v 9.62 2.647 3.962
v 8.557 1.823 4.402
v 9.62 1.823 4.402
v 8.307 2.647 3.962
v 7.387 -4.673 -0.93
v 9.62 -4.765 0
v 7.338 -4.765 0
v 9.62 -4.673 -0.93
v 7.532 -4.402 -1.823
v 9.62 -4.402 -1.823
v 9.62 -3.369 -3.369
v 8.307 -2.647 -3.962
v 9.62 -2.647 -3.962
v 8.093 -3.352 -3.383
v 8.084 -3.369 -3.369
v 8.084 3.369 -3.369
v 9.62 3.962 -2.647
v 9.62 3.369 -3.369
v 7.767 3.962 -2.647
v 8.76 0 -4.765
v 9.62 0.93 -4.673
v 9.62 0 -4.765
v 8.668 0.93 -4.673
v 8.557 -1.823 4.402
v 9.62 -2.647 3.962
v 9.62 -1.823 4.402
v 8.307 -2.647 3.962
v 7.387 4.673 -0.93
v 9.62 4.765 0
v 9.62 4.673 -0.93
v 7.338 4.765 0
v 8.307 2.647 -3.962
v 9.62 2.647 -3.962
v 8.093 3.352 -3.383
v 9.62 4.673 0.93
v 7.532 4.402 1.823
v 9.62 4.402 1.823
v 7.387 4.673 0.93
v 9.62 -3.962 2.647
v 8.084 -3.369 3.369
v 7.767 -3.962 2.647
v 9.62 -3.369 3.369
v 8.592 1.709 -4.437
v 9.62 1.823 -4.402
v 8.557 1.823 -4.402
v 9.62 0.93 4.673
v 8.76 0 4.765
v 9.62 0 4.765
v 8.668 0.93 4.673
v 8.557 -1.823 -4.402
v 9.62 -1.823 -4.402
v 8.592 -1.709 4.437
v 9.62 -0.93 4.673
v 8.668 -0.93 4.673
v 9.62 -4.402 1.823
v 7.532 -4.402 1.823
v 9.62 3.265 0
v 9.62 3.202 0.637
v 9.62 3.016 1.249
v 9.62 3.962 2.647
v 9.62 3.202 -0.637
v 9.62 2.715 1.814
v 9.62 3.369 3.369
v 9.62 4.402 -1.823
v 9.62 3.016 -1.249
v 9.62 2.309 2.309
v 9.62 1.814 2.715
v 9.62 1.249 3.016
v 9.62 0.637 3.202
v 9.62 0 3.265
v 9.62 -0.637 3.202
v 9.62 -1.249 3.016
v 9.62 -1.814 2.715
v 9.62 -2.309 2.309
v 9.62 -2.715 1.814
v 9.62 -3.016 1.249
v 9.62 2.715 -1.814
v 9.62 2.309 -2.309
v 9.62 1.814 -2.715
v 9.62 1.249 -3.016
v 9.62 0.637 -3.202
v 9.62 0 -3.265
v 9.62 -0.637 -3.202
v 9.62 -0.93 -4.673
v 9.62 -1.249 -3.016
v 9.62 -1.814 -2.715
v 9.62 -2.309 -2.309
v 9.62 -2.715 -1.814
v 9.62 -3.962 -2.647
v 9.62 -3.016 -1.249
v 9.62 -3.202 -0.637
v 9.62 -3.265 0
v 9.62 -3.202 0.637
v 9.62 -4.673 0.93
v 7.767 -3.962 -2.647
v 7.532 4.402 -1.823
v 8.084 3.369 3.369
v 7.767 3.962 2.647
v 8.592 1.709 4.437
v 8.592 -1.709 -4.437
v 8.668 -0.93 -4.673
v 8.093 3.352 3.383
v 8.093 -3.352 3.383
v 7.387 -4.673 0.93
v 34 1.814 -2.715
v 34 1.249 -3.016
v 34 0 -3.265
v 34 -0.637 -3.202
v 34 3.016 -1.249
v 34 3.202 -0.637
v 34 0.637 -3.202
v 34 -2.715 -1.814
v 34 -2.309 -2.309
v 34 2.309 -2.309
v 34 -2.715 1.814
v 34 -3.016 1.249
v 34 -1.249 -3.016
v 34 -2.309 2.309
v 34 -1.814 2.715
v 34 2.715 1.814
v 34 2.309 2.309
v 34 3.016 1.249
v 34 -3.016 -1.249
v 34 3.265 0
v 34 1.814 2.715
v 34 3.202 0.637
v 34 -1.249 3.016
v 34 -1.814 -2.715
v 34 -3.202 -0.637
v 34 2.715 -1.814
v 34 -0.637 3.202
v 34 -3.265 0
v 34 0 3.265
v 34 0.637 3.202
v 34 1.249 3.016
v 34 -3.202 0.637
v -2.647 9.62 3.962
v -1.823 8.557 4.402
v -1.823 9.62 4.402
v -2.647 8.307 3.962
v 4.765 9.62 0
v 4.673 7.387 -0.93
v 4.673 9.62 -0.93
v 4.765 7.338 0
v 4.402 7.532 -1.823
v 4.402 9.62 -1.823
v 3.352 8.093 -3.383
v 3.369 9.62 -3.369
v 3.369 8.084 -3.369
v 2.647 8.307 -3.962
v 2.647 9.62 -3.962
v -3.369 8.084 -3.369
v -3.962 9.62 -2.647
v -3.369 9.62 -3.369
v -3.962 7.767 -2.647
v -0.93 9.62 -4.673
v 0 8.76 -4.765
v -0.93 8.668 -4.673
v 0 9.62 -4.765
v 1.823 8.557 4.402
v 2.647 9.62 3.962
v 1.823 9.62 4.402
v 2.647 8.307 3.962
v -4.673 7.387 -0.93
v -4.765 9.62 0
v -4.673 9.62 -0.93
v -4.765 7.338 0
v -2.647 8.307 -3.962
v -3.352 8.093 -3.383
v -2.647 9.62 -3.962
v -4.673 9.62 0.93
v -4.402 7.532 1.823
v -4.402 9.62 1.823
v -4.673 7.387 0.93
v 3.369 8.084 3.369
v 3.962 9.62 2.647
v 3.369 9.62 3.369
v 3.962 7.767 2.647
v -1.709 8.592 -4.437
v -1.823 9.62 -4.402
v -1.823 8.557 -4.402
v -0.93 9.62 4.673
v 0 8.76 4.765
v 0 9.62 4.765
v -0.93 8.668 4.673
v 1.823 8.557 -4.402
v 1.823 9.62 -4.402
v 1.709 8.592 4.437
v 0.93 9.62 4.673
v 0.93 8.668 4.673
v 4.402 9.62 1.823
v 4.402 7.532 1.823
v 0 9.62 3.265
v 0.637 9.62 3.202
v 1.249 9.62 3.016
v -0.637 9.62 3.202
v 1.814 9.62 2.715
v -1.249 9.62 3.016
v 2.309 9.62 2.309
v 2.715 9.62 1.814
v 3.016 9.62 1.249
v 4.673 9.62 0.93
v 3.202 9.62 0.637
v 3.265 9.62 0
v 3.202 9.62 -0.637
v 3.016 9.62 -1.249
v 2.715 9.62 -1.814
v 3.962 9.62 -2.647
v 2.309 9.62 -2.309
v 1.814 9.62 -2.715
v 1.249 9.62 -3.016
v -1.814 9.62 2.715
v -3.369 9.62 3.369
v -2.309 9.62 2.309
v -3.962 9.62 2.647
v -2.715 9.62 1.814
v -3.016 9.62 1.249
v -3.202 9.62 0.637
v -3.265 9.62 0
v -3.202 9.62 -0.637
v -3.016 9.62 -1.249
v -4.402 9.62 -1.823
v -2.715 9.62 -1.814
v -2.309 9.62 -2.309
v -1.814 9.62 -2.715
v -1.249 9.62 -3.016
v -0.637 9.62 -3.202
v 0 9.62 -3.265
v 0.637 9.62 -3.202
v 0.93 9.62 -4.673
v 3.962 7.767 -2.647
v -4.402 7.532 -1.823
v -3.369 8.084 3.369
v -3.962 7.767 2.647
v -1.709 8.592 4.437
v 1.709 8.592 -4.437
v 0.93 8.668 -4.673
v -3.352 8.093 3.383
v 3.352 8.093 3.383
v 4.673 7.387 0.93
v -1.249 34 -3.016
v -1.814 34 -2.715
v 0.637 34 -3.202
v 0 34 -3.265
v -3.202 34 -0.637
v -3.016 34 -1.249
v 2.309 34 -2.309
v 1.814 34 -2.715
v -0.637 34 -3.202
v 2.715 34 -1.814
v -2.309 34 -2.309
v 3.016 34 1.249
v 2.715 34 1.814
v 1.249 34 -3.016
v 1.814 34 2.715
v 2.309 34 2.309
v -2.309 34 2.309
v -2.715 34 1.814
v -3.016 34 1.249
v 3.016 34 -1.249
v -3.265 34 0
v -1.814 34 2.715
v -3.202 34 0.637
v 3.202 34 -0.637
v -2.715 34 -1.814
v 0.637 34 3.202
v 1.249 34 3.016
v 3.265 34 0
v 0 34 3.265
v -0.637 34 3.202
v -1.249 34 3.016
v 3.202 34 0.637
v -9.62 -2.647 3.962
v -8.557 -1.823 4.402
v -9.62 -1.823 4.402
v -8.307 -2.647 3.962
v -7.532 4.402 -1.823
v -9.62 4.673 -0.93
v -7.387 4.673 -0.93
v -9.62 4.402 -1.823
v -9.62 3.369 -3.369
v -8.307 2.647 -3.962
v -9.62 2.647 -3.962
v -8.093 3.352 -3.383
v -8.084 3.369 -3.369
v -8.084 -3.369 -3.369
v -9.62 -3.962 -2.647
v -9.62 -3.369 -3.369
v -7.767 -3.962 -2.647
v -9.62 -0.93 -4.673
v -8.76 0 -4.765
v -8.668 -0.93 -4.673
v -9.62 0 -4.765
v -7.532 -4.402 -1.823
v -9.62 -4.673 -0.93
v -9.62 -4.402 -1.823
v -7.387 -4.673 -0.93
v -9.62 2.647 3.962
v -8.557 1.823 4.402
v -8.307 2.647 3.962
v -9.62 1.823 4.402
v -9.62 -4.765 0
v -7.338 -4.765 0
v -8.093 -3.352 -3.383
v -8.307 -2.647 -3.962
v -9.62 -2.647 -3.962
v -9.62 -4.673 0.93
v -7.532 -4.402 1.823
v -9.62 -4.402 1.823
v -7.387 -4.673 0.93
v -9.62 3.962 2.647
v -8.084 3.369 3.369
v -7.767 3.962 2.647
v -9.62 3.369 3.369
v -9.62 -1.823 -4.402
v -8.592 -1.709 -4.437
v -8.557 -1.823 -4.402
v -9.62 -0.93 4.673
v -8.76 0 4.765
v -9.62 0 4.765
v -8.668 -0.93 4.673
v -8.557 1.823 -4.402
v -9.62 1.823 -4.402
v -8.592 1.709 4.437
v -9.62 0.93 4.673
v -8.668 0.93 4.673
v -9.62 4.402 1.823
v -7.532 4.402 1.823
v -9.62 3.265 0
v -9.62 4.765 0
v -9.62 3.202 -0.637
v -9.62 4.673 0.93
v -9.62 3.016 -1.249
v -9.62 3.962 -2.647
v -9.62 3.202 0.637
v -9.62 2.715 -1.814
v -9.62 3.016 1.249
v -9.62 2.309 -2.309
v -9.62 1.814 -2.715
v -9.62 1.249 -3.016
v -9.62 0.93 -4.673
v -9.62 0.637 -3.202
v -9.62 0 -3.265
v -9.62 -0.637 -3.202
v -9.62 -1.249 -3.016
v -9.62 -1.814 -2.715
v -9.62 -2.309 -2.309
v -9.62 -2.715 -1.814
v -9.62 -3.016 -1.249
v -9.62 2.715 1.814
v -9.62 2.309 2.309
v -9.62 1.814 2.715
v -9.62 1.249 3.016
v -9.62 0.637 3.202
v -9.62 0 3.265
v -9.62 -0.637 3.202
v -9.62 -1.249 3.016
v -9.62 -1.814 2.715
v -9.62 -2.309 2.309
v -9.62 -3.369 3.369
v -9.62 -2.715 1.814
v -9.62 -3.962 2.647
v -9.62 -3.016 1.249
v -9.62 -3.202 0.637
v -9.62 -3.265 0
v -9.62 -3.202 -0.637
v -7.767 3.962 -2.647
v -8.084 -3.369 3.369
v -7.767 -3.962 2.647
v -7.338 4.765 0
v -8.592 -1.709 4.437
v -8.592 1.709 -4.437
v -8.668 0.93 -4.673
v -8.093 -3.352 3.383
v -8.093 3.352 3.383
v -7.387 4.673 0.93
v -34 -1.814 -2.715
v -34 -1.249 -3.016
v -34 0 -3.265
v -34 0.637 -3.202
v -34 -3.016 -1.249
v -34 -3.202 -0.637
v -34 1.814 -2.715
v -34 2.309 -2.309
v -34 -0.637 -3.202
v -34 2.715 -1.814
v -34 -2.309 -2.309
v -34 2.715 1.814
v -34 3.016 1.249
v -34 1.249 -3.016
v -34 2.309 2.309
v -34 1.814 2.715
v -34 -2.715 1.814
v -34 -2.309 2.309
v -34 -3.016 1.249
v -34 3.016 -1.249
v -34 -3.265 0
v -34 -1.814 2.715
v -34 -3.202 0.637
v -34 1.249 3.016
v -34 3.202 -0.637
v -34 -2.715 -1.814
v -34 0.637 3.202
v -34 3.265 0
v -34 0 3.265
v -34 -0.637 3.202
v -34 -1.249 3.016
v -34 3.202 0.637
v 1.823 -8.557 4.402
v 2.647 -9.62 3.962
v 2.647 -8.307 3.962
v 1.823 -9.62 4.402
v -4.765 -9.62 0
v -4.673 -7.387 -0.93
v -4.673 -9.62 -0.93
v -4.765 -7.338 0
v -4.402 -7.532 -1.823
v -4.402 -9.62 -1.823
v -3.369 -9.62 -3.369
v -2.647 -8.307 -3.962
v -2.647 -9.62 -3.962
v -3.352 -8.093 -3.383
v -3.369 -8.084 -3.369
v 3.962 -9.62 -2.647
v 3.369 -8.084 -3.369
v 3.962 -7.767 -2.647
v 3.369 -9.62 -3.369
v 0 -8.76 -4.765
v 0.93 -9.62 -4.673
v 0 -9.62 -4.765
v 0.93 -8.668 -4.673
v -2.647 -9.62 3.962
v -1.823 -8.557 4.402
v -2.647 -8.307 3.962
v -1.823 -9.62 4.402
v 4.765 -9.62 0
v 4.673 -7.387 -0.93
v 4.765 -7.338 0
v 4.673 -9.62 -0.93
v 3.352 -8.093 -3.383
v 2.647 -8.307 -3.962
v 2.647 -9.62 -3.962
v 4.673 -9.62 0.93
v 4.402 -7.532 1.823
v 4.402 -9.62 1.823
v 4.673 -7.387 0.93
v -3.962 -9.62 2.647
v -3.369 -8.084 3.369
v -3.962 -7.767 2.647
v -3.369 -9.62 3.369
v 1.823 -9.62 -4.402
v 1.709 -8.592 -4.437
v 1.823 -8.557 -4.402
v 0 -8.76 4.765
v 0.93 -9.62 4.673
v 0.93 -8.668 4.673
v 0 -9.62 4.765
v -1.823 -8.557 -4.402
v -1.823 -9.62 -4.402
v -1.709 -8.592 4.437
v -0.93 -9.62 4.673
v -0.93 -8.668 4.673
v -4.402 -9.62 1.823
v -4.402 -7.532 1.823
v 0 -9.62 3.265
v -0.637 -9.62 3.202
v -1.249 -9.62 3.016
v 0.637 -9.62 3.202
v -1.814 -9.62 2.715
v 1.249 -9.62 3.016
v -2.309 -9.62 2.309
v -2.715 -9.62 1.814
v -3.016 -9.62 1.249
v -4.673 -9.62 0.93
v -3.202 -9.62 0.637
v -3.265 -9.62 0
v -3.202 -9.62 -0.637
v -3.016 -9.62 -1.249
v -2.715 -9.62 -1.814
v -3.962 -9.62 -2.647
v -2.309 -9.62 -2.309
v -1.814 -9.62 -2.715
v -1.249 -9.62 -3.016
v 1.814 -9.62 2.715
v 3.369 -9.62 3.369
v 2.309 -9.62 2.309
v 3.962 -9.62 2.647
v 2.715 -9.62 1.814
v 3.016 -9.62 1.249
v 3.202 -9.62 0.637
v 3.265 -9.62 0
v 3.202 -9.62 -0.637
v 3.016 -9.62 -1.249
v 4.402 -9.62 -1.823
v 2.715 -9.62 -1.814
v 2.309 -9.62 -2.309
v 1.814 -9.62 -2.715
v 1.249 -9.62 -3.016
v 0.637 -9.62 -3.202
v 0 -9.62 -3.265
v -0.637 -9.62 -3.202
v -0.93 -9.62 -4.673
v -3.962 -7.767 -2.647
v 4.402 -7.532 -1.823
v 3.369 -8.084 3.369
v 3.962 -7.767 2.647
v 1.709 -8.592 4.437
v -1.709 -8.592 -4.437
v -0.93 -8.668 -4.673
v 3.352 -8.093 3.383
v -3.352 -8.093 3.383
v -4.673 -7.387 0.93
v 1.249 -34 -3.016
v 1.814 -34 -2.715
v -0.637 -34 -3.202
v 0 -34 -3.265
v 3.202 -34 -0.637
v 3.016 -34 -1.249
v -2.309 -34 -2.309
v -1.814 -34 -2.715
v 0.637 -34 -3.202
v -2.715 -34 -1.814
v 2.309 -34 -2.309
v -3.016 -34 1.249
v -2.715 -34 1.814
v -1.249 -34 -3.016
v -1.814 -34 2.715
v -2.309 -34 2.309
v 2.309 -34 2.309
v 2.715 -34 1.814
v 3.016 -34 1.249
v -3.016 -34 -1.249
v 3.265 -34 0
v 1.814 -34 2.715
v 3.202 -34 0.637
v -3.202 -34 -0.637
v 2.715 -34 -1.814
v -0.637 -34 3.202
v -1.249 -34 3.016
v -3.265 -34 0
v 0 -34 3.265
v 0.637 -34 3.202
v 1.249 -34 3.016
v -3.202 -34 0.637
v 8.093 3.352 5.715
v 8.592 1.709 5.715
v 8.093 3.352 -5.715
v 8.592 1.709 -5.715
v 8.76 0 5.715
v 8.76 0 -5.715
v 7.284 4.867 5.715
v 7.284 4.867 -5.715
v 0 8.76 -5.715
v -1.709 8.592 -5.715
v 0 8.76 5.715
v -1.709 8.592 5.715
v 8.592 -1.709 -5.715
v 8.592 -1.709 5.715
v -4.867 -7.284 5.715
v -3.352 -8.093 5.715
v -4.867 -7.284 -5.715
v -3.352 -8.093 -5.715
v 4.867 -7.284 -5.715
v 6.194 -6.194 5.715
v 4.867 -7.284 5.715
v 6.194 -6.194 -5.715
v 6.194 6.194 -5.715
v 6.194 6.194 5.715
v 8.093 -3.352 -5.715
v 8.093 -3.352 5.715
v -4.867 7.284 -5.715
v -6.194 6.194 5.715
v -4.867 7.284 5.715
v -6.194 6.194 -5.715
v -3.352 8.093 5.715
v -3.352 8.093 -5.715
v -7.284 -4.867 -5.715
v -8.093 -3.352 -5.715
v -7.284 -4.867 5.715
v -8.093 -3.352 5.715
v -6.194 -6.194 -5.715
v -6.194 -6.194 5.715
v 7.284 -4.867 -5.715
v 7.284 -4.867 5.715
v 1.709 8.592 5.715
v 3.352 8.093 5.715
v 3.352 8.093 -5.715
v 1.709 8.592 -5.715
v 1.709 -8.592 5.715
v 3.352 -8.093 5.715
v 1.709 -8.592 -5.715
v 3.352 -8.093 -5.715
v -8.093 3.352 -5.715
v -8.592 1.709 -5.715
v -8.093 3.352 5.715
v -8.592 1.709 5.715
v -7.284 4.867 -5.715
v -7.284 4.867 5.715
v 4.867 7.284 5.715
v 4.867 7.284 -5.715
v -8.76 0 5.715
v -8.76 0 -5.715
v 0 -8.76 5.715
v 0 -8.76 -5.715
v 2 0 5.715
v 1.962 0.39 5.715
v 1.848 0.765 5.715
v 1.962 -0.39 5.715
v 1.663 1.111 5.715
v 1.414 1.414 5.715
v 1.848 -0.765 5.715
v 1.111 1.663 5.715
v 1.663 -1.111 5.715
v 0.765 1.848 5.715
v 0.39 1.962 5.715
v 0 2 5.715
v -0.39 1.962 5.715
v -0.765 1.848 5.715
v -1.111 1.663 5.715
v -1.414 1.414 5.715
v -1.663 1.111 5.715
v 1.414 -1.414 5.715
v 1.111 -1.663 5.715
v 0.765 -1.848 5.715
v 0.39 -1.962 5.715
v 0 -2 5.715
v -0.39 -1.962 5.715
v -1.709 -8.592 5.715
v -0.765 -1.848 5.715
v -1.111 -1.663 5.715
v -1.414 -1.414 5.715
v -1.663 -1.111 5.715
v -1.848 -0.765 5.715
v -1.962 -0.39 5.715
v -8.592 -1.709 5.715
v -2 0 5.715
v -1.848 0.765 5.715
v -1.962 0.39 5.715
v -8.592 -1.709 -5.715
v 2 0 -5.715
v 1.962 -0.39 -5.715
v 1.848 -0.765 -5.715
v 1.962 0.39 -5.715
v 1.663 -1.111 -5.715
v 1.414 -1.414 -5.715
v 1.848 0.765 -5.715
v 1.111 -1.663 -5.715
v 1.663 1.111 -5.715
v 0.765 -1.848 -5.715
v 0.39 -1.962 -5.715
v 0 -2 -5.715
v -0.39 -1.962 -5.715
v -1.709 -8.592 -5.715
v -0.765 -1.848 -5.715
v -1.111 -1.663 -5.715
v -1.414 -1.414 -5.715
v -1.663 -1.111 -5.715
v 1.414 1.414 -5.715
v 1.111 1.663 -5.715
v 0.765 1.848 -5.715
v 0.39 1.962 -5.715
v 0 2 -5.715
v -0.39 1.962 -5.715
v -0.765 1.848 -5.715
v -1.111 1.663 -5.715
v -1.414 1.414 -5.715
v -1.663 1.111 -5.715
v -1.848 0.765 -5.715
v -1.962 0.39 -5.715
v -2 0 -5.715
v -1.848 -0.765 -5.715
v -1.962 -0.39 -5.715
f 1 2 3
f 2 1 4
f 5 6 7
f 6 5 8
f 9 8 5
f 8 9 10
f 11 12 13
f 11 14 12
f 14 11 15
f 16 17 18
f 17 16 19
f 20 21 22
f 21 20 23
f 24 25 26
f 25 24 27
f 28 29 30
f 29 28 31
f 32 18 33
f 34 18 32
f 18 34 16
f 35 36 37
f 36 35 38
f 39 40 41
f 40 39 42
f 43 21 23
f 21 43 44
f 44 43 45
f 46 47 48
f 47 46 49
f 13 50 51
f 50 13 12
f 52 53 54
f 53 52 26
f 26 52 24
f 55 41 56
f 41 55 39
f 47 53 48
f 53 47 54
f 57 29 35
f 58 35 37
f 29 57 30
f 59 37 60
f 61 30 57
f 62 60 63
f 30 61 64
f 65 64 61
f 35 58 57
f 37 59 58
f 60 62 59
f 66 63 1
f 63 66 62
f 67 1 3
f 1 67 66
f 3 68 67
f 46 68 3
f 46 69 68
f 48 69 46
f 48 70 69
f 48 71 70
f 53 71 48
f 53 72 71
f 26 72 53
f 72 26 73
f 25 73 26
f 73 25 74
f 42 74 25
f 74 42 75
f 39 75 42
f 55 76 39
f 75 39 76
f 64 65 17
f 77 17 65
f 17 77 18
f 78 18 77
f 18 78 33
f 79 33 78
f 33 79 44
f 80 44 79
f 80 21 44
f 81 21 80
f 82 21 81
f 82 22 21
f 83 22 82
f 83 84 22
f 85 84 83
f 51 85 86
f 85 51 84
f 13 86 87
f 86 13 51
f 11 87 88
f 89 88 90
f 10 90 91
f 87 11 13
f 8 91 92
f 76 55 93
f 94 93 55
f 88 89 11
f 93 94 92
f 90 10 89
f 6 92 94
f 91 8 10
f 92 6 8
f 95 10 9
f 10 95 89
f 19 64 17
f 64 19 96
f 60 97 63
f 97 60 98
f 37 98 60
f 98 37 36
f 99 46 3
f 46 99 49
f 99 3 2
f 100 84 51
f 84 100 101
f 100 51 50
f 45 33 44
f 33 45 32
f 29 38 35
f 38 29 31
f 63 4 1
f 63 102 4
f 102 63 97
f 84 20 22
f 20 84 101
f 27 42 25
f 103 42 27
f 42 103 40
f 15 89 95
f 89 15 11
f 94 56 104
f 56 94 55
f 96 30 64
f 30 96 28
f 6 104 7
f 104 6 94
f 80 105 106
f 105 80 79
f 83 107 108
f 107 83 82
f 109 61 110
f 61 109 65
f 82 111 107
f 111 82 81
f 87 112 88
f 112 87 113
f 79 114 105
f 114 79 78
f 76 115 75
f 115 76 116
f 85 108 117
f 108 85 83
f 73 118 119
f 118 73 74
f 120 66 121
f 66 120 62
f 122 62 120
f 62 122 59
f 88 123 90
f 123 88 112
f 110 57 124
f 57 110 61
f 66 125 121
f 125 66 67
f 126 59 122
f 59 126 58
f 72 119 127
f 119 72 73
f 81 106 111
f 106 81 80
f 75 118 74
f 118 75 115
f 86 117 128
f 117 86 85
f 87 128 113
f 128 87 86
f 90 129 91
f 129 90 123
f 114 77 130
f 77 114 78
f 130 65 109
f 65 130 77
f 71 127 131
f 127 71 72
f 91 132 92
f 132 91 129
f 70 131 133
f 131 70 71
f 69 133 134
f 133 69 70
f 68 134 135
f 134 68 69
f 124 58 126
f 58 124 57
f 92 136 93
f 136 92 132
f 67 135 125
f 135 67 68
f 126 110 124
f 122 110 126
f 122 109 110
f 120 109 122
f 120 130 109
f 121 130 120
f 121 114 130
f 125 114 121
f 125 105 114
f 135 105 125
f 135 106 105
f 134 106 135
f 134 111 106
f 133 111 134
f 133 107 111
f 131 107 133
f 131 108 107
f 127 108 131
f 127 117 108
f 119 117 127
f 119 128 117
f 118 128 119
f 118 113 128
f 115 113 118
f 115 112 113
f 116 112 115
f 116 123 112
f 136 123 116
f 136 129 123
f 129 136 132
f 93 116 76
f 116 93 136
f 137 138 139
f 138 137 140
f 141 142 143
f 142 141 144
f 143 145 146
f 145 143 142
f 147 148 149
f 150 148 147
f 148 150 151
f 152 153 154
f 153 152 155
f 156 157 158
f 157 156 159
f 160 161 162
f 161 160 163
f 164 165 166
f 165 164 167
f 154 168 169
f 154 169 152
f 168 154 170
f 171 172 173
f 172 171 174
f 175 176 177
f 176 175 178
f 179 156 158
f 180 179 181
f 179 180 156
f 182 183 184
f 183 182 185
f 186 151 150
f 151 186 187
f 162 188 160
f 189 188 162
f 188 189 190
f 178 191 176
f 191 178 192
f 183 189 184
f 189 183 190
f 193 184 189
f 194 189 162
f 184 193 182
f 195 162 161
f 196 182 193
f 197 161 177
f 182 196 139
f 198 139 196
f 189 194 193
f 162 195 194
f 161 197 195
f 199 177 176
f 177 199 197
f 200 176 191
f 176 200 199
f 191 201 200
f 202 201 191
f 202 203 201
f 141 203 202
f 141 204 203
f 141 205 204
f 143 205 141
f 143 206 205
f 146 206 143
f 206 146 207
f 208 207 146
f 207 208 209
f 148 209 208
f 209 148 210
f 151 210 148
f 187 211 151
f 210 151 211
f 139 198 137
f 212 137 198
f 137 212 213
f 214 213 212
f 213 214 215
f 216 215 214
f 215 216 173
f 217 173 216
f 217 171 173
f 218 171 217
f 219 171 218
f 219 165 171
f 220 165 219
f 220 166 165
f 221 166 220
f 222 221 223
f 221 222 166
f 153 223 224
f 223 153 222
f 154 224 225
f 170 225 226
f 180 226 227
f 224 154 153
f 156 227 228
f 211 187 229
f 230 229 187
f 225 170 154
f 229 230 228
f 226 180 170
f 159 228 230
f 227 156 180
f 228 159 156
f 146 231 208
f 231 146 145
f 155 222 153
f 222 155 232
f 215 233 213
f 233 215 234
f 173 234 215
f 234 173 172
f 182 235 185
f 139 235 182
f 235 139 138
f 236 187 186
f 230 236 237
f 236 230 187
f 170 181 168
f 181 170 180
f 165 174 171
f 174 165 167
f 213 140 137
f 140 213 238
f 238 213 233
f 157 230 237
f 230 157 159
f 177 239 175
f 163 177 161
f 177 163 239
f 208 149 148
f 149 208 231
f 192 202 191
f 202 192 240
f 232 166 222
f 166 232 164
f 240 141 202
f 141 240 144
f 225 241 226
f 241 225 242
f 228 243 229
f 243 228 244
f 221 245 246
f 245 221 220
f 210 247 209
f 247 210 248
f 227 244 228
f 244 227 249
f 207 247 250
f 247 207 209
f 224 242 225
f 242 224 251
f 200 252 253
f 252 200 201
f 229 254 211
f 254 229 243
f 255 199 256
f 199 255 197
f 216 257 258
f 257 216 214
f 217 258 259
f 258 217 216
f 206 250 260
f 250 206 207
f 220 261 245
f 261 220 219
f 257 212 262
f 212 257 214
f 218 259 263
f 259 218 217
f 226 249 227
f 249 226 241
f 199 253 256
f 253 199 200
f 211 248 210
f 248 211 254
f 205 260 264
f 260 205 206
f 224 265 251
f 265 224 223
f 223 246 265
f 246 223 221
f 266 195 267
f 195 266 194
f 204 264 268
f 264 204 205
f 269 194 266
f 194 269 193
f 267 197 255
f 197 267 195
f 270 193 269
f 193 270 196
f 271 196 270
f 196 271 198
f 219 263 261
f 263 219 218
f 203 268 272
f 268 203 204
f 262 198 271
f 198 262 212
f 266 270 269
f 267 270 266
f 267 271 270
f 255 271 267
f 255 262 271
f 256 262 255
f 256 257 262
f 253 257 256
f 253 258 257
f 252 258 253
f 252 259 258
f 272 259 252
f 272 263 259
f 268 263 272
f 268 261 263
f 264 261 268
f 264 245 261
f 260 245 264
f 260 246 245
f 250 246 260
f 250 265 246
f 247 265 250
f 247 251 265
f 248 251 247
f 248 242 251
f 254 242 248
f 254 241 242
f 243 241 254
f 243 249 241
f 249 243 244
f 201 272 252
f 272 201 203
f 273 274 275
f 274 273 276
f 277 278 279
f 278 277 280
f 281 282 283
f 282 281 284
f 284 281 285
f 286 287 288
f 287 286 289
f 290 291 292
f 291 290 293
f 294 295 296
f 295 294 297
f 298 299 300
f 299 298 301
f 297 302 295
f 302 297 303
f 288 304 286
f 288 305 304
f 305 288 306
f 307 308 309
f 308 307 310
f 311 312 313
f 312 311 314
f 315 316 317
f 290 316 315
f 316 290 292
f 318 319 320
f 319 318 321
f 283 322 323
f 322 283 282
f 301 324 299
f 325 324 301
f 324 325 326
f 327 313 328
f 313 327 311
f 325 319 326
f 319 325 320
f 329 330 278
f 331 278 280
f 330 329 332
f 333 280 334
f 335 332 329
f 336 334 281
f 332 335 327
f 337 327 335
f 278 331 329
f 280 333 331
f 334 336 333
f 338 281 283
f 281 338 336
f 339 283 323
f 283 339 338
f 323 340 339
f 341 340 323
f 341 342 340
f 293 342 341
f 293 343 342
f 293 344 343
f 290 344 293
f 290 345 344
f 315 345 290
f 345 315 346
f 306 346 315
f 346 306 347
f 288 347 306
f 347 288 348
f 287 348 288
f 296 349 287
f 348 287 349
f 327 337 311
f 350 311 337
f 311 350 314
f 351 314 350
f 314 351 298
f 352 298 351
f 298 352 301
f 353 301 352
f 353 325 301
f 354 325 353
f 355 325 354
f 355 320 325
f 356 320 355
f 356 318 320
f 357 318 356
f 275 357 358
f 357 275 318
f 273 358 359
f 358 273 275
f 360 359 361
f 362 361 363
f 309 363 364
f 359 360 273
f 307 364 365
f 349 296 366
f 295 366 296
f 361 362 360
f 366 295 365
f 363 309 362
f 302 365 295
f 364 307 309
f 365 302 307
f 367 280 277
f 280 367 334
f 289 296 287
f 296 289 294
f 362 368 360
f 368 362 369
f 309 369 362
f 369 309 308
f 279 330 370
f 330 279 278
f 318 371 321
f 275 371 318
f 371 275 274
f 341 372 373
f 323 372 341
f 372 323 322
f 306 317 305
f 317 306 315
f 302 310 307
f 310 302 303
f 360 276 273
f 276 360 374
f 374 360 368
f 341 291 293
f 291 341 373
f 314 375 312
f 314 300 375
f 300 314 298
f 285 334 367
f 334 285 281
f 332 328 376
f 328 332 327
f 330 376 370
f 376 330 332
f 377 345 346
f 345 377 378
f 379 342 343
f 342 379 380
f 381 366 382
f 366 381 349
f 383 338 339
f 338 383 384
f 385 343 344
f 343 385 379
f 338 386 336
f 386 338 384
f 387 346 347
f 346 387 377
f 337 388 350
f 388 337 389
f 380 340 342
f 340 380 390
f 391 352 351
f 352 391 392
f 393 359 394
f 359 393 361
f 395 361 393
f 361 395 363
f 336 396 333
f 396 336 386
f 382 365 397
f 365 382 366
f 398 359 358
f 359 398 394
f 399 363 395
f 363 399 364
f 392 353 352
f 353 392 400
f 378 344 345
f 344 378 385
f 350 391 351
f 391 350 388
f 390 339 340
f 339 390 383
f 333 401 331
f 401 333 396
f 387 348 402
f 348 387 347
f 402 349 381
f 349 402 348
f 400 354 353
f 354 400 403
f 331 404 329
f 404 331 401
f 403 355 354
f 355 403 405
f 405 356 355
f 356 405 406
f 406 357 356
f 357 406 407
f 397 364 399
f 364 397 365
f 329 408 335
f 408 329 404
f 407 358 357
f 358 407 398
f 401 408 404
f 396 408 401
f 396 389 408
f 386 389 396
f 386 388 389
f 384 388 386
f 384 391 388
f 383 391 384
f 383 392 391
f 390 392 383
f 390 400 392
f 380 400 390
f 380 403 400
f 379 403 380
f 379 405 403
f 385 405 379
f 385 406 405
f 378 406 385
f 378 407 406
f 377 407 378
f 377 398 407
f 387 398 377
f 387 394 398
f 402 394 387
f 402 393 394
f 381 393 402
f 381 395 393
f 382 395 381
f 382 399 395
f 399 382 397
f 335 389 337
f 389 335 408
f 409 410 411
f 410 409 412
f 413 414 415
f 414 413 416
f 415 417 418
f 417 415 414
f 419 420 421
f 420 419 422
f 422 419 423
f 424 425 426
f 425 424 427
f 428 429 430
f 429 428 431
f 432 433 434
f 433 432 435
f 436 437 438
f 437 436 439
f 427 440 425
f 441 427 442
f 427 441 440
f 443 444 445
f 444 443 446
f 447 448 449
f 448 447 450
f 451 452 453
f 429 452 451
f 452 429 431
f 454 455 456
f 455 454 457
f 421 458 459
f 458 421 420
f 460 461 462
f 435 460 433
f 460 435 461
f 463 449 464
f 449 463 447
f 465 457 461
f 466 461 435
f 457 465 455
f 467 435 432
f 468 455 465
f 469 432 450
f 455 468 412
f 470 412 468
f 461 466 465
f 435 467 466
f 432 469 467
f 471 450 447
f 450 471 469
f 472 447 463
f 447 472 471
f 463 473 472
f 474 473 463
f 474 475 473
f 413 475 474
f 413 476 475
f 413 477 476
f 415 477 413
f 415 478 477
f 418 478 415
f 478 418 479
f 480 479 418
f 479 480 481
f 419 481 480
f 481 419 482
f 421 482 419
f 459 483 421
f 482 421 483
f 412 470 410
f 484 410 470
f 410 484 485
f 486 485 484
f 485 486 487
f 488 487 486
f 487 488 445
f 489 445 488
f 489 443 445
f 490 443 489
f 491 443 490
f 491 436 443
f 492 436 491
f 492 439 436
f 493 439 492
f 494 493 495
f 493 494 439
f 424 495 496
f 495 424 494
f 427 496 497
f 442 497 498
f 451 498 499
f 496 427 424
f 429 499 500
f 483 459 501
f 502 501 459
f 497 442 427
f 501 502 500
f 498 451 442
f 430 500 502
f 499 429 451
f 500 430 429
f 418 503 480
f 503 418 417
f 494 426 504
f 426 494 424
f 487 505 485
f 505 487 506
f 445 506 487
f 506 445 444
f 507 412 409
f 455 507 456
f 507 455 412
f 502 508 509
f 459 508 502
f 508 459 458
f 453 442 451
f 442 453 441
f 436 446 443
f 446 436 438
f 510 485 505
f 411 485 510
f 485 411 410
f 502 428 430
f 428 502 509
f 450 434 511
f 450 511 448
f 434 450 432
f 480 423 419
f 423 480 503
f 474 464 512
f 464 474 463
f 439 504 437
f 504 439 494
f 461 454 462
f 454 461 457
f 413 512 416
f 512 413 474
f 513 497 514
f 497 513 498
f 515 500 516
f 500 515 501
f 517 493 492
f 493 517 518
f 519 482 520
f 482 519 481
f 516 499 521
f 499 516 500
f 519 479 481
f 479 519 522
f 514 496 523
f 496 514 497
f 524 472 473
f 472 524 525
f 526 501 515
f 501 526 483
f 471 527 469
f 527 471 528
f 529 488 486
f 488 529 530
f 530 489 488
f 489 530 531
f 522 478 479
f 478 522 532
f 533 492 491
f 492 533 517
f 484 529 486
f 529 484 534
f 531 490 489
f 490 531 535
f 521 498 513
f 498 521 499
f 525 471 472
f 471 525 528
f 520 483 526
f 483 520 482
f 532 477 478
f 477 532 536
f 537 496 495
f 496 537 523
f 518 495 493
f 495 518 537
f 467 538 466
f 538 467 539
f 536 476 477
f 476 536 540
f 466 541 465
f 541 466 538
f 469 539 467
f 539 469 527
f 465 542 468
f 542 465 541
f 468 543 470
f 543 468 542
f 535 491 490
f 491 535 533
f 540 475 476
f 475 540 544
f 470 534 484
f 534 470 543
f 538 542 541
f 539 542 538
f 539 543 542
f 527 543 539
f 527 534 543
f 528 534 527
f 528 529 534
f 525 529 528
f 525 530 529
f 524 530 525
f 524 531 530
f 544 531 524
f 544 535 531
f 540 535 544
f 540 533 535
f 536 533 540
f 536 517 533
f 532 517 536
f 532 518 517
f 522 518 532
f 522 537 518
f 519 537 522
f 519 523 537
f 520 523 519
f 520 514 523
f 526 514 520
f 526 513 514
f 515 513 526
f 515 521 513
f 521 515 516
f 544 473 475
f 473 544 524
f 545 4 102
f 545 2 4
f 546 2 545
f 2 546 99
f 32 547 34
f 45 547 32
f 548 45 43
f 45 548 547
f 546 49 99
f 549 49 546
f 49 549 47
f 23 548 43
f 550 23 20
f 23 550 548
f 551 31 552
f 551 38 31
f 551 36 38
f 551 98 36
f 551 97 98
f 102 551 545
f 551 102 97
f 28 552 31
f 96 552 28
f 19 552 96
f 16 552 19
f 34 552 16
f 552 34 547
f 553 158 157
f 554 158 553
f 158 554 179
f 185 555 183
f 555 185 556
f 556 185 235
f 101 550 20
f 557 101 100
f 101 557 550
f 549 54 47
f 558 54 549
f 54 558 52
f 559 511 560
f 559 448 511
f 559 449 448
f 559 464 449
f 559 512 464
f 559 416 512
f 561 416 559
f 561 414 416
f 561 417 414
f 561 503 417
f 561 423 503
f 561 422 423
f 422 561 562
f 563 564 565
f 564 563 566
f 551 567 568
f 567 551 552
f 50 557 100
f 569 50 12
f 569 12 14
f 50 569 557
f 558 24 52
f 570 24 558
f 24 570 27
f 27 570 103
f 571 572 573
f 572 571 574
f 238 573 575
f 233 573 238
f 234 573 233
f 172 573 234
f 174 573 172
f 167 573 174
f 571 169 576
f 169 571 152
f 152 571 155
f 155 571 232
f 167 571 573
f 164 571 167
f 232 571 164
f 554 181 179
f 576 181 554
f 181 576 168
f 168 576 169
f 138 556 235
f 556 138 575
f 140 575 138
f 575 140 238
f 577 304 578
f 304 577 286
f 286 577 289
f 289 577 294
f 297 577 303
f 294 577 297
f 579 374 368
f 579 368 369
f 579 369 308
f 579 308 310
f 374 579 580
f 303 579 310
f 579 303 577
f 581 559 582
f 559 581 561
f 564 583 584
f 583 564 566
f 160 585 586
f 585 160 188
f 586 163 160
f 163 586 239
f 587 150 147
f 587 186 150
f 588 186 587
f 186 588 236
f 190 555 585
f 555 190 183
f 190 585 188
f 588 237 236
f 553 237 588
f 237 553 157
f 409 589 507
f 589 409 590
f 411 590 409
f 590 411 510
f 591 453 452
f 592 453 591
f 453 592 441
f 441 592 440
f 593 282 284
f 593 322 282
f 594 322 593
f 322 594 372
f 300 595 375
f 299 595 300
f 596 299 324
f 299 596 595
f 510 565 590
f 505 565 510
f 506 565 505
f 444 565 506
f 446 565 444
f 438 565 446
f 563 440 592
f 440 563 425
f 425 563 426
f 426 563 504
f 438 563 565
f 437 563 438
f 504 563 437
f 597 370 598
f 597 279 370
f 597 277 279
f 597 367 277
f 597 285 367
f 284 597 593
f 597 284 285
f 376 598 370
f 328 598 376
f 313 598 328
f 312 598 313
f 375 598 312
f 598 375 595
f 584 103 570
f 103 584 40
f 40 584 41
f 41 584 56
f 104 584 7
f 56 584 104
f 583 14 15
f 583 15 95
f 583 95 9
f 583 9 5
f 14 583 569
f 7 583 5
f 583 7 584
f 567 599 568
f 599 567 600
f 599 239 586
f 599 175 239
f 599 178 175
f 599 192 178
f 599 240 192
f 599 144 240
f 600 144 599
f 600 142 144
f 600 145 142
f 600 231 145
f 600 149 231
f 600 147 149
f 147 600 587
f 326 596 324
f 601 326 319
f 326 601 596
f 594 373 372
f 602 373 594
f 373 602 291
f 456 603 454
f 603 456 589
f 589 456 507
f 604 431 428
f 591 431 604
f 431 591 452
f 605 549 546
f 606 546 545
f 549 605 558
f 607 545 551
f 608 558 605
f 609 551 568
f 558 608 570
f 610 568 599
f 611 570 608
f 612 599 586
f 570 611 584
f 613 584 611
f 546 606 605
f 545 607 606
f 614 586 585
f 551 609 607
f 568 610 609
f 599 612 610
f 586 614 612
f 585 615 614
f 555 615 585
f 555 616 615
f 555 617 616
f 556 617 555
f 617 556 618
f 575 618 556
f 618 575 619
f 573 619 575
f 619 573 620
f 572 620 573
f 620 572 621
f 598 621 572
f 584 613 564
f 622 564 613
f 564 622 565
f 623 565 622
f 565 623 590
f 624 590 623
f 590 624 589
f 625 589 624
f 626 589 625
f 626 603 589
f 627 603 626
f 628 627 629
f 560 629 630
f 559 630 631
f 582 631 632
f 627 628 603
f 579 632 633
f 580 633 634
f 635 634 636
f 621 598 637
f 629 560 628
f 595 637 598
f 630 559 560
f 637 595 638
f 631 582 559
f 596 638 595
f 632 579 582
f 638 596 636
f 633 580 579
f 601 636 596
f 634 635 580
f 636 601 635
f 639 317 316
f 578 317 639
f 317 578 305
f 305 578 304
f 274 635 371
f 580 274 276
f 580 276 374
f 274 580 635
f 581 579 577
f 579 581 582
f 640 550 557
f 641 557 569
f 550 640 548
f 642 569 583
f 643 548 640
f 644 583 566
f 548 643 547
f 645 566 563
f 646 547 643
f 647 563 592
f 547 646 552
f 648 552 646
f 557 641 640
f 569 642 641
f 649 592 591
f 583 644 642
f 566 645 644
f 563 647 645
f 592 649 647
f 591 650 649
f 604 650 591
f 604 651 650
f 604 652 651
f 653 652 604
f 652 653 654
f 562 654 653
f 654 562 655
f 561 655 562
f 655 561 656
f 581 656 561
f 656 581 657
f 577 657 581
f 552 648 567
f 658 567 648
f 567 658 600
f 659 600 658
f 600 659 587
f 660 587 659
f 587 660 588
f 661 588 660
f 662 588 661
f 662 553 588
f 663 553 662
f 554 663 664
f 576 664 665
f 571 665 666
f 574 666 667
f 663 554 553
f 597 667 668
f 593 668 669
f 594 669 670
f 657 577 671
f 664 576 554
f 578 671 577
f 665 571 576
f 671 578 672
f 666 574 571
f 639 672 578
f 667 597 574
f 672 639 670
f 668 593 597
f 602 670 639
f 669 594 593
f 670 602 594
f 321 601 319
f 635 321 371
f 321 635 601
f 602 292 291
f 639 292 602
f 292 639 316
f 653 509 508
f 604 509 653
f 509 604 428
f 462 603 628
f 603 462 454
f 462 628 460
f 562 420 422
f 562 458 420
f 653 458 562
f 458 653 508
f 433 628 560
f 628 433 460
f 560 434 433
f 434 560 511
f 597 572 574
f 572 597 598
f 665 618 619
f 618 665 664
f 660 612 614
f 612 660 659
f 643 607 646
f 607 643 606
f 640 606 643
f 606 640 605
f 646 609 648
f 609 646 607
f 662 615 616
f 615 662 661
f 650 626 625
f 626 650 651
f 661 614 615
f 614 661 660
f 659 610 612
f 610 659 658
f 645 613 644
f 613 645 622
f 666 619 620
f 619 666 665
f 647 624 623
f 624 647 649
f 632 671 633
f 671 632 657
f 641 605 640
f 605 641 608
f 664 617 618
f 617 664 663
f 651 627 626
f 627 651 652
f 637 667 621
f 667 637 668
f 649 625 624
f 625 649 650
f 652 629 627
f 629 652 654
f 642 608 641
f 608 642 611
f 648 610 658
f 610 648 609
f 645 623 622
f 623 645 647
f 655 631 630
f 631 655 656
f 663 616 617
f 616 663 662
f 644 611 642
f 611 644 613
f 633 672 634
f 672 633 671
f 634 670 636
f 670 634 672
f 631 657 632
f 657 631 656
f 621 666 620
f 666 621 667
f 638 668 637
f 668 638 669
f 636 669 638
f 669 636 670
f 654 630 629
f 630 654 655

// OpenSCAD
$fn = 32;

// ----------------------------------------------------------------------
// Cardan cross: 68 mm span, 9.53 mm trunnions
// ----------------------------------------------------------------------

// --- parameters (mm) ---
journal_d = 9.53;         // trunnion diameter
arm_len = 34;             // trunnion length from the centre
step_r = 3.24;            // step position from the centre
step_d = 6.53;            // journal diameter after the step
hub_d = 17.52;            // hub diameter
hub_h = 11.43;            // hub height
bore_d = 4;               // hub bore

difference() {
  union() {
    /* hub along the joint axis */
    cylinder(h = hub_h, d = hub_d, center = true);
    for (a = [0 : 90 : 270]) rotate([0, 0, a]) {
      /* trunnion, sunk into the hub */
      translate([hub_d / 4, 0, 0]) rotate([0, 90, 0]) cylinder(h = step_r + 2, d = journal_d);
      /* stepped journal out to the tip */
      translate([step_r - 0.5, 0, 0]) rotate([0, 90, 0]) cylinder(h = arm_len + 0.5 - step_r, d = step_d);
    }
  }
  /* lubrication bore through the hub, 2.5 mm clear on both sides */
  translate([0, 0, -hub_h / 2 - 2.5]) cylinder(h = hub_h + 5, d = bore_d);
}
